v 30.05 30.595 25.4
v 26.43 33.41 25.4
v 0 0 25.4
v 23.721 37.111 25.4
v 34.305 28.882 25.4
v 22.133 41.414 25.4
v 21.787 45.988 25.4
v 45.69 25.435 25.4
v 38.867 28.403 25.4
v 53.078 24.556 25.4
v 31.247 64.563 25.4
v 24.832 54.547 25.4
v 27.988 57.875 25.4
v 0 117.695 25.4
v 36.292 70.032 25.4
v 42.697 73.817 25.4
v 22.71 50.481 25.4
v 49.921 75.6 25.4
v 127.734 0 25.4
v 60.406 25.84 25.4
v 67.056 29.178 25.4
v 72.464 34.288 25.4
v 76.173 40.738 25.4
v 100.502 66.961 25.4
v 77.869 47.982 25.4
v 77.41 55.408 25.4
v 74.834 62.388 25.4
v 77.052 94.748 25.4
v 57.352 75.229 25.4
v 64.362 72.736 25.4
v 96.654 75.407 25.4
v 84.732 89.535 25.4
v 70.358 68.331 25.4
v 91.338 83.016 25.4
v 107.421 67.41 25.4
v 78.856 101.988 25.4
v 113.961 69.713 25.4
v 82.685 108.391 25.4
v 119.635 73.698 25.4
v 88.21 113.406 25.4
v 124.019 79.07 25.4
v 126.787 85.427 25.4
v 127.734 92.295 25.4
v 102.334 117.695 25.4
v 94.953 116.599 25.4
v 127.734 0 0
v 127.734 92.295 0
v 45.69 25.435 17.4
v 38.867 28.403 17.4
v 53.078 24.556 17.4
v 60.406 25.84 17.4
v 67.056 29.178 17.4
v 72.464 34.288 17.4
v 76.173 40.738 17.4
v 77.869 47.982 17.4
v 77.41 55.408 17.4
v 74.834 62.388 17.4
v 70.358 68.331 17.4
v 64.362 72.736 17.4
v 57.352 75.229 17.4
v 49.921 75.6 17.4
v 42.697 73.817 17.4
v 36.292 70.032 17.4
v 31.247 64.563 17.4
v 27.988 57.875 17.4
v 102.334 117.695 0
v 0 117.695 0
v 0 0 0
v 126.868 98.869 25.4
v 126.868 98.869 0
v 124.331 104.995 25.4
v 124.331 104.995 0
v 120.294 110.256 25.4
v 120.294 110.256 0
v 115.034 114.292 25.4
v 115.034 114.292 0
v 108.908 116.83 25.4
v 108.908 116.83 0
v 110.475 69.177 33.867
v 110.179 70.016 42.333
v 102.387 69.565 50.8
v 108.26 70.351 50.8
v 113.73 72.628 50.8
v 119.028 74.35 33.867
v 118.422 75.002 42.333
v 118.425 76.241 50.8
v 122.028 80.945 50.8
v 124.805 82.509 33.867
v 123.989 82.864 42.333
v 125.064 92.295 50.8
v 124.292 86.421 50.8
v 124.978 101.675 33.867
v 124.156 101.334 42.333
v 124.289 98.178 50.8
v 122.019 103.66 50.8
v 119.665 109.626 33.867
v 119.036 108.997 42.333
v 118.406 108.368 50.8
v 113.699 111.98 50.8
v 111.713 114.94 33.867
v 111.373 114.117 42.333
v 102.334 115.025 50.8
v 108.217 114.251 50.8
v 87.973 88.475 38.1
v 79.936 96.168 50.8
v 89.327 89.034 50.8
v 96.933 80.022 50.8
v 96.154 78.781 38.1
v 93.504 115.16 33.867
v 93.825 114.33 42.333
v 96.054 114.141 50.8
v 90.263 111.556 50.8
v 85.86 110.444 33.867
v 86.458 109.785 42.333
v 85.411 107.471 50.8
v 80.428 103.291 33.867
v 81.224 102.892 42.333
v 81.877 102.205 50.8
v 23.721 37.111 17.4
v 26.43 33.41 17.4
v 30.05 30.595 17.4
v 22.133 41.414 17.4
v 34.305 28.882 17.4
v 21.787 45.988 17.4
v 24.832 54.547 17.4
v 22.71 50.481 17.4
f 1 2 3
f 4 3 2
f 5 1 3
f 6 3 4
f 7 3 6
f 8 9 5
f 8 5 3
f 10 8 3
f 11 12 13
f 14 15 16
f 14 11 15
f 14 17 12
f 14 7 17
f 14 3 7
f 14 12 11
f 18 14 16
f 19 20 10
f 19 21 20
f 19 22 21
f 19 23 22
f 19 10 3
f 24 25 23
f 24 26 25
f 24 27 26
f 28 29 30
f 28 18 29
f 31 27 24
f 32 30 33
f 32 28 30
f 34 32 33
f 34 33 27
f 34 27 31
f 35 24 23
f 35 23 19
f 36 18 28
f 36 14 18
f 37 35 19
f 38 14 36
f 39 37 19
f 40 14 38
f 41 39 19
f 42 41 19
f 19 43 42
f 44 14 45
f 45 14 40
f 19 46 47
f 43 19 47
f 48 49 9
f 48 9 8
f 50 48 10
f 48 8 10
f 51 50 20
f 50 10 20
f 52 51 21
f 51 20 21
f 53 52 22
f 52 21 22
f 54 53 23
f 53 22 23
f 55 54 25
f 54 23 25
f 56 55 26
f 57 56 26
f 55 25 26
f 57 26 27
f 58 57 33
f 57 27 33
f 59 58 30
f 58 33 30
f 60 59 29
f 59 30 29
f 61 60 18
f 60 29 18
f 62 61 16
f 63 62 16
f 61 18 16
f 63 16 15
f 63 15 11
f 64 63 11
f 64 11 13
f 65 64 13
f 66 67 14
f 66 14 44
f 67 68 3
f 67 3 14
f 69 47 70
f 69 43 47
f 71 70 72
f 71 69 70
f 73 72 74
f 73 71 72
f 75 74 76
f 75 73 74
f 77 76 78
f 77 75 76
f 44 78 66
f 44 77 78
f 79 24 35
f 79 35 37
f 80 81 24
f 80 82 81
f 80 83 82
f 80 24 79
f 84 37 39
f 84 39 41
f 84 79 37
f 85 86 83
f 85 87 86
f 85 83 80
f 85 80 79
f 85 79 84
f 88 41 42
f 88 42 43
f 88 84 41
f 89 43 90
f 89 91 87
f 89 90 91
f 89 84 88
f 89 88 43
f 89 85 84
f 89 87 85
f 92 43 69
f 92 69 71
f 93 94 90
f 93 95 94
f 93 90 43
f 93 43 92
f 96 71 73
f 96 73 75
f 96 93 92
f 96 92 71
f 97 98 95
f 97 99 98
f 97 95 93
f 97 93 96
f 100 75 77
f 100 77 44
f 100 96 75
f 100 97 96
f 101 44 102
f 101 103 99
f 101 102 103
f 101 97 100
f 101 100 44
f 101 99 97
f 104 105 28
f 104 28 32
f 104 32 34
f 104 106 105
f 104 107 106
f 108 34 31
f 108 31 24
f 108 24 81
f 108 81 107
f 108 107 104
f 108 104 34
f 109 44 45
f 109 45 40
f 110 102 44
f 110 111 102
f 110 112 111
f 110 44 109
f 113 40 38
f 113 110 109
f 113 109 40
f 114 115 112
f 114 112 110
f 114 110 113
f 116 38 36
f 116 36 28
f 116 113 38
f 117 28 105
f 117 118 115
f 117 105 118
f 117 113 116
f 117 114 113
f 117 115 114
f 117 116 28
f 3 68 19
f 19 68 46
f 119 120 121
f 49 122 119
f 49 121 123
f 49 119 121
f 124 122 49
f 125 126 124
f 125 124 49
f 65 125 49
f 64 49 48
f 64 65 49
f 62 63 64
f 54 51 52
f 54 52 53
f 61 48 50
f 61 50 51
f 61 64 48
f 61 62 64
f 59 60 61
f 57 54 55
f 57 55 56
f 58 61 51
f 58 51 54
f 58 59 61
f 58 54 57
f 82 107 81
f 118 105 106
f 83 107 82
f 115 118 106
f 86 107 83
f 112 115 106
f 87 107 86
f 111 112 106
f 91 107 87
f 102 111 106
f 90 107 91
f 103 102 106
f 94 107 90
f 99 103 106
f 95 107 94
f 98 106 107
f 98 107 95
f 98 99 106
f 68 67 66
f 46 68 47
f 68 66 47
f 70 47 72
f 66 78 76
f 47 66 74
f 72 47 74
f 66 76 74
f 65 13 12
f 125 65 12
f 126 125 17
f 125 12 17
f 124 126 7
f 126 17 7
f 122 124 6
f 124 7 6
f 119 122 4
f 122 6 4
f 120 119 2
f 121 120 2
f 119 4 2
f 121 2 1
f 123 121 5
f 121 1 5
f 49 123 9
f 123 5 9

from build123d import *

# Parameters (mm, degrees)
F0_W     = 127.7336031199
F0_H     = 117.6951080561
F1_DEPTH = 25.4
F2_R     = 25.4
F4_DEPTH = 8
F6_DEPTH = 25.4
F6_TAPER = 6


with BuildPart() as f1:
    # F0 (on Top) → F1 (new body)
    with BuildSketch(Plane.XY):
        with Locations((63.8668015599, 58.847554028)):
            Rectangle(F0_W, F0_H)
    extrude(amount=F1_DEPTH)

    # F2
    f2_edges = [f1.edges().sort_by_distance(p)[0] for p in [
        (127.733603, 117.695108, 12.7),
    ]]
    fillet(f2_edges, radius=F2_R)

    # F3 (on face) → F4 (cut)
    with BuildSketch(Plane.XY.offset(25.4)):
        with BuildLine():
            ThreePointArc((38.8666712233, 28.4028087029), (76.3769148887, 58.9921224705), (27.9881136193, 57.8748005294))
            ThreePointArc((27.9881136193, 57.8748005294), (22.7769180991, 39.2075535793), (38.8666712233, 28.4028087029))
        make_face()
    extrude(amount=-F4_DEPTH, mode=Mode.SUBTRACT)

    # F5 (on face) → F6 (join)
    with BuildSketch(Plane.XY.offset(25.4)):
        with BuildLine():
            ThreePointArc((77.0522903969, 94.7477040289), (91.3384484979, 83.0158556177), (100.5024355694, 66.9612014208))
            ThreePointArc((100.5024355694, 66.9612014208), (119.6345907249, 73.6984463156), (127.7336031199, 92.2951080561))
            ThreePointArc((127.7336031199, 92.2951080561), (120.294115362, 110.2556202982), (102.3336031199, 117.6951080561))
            ThreePointArc((102.3336031199, 117.6951080561), (85.26222265, 111.1027652428), (77.0522903969, 94.7477040289))
        make_face()
    extrude(amount=F6_DEPTH, taper=F6_TAPER)


solid = f1.part
